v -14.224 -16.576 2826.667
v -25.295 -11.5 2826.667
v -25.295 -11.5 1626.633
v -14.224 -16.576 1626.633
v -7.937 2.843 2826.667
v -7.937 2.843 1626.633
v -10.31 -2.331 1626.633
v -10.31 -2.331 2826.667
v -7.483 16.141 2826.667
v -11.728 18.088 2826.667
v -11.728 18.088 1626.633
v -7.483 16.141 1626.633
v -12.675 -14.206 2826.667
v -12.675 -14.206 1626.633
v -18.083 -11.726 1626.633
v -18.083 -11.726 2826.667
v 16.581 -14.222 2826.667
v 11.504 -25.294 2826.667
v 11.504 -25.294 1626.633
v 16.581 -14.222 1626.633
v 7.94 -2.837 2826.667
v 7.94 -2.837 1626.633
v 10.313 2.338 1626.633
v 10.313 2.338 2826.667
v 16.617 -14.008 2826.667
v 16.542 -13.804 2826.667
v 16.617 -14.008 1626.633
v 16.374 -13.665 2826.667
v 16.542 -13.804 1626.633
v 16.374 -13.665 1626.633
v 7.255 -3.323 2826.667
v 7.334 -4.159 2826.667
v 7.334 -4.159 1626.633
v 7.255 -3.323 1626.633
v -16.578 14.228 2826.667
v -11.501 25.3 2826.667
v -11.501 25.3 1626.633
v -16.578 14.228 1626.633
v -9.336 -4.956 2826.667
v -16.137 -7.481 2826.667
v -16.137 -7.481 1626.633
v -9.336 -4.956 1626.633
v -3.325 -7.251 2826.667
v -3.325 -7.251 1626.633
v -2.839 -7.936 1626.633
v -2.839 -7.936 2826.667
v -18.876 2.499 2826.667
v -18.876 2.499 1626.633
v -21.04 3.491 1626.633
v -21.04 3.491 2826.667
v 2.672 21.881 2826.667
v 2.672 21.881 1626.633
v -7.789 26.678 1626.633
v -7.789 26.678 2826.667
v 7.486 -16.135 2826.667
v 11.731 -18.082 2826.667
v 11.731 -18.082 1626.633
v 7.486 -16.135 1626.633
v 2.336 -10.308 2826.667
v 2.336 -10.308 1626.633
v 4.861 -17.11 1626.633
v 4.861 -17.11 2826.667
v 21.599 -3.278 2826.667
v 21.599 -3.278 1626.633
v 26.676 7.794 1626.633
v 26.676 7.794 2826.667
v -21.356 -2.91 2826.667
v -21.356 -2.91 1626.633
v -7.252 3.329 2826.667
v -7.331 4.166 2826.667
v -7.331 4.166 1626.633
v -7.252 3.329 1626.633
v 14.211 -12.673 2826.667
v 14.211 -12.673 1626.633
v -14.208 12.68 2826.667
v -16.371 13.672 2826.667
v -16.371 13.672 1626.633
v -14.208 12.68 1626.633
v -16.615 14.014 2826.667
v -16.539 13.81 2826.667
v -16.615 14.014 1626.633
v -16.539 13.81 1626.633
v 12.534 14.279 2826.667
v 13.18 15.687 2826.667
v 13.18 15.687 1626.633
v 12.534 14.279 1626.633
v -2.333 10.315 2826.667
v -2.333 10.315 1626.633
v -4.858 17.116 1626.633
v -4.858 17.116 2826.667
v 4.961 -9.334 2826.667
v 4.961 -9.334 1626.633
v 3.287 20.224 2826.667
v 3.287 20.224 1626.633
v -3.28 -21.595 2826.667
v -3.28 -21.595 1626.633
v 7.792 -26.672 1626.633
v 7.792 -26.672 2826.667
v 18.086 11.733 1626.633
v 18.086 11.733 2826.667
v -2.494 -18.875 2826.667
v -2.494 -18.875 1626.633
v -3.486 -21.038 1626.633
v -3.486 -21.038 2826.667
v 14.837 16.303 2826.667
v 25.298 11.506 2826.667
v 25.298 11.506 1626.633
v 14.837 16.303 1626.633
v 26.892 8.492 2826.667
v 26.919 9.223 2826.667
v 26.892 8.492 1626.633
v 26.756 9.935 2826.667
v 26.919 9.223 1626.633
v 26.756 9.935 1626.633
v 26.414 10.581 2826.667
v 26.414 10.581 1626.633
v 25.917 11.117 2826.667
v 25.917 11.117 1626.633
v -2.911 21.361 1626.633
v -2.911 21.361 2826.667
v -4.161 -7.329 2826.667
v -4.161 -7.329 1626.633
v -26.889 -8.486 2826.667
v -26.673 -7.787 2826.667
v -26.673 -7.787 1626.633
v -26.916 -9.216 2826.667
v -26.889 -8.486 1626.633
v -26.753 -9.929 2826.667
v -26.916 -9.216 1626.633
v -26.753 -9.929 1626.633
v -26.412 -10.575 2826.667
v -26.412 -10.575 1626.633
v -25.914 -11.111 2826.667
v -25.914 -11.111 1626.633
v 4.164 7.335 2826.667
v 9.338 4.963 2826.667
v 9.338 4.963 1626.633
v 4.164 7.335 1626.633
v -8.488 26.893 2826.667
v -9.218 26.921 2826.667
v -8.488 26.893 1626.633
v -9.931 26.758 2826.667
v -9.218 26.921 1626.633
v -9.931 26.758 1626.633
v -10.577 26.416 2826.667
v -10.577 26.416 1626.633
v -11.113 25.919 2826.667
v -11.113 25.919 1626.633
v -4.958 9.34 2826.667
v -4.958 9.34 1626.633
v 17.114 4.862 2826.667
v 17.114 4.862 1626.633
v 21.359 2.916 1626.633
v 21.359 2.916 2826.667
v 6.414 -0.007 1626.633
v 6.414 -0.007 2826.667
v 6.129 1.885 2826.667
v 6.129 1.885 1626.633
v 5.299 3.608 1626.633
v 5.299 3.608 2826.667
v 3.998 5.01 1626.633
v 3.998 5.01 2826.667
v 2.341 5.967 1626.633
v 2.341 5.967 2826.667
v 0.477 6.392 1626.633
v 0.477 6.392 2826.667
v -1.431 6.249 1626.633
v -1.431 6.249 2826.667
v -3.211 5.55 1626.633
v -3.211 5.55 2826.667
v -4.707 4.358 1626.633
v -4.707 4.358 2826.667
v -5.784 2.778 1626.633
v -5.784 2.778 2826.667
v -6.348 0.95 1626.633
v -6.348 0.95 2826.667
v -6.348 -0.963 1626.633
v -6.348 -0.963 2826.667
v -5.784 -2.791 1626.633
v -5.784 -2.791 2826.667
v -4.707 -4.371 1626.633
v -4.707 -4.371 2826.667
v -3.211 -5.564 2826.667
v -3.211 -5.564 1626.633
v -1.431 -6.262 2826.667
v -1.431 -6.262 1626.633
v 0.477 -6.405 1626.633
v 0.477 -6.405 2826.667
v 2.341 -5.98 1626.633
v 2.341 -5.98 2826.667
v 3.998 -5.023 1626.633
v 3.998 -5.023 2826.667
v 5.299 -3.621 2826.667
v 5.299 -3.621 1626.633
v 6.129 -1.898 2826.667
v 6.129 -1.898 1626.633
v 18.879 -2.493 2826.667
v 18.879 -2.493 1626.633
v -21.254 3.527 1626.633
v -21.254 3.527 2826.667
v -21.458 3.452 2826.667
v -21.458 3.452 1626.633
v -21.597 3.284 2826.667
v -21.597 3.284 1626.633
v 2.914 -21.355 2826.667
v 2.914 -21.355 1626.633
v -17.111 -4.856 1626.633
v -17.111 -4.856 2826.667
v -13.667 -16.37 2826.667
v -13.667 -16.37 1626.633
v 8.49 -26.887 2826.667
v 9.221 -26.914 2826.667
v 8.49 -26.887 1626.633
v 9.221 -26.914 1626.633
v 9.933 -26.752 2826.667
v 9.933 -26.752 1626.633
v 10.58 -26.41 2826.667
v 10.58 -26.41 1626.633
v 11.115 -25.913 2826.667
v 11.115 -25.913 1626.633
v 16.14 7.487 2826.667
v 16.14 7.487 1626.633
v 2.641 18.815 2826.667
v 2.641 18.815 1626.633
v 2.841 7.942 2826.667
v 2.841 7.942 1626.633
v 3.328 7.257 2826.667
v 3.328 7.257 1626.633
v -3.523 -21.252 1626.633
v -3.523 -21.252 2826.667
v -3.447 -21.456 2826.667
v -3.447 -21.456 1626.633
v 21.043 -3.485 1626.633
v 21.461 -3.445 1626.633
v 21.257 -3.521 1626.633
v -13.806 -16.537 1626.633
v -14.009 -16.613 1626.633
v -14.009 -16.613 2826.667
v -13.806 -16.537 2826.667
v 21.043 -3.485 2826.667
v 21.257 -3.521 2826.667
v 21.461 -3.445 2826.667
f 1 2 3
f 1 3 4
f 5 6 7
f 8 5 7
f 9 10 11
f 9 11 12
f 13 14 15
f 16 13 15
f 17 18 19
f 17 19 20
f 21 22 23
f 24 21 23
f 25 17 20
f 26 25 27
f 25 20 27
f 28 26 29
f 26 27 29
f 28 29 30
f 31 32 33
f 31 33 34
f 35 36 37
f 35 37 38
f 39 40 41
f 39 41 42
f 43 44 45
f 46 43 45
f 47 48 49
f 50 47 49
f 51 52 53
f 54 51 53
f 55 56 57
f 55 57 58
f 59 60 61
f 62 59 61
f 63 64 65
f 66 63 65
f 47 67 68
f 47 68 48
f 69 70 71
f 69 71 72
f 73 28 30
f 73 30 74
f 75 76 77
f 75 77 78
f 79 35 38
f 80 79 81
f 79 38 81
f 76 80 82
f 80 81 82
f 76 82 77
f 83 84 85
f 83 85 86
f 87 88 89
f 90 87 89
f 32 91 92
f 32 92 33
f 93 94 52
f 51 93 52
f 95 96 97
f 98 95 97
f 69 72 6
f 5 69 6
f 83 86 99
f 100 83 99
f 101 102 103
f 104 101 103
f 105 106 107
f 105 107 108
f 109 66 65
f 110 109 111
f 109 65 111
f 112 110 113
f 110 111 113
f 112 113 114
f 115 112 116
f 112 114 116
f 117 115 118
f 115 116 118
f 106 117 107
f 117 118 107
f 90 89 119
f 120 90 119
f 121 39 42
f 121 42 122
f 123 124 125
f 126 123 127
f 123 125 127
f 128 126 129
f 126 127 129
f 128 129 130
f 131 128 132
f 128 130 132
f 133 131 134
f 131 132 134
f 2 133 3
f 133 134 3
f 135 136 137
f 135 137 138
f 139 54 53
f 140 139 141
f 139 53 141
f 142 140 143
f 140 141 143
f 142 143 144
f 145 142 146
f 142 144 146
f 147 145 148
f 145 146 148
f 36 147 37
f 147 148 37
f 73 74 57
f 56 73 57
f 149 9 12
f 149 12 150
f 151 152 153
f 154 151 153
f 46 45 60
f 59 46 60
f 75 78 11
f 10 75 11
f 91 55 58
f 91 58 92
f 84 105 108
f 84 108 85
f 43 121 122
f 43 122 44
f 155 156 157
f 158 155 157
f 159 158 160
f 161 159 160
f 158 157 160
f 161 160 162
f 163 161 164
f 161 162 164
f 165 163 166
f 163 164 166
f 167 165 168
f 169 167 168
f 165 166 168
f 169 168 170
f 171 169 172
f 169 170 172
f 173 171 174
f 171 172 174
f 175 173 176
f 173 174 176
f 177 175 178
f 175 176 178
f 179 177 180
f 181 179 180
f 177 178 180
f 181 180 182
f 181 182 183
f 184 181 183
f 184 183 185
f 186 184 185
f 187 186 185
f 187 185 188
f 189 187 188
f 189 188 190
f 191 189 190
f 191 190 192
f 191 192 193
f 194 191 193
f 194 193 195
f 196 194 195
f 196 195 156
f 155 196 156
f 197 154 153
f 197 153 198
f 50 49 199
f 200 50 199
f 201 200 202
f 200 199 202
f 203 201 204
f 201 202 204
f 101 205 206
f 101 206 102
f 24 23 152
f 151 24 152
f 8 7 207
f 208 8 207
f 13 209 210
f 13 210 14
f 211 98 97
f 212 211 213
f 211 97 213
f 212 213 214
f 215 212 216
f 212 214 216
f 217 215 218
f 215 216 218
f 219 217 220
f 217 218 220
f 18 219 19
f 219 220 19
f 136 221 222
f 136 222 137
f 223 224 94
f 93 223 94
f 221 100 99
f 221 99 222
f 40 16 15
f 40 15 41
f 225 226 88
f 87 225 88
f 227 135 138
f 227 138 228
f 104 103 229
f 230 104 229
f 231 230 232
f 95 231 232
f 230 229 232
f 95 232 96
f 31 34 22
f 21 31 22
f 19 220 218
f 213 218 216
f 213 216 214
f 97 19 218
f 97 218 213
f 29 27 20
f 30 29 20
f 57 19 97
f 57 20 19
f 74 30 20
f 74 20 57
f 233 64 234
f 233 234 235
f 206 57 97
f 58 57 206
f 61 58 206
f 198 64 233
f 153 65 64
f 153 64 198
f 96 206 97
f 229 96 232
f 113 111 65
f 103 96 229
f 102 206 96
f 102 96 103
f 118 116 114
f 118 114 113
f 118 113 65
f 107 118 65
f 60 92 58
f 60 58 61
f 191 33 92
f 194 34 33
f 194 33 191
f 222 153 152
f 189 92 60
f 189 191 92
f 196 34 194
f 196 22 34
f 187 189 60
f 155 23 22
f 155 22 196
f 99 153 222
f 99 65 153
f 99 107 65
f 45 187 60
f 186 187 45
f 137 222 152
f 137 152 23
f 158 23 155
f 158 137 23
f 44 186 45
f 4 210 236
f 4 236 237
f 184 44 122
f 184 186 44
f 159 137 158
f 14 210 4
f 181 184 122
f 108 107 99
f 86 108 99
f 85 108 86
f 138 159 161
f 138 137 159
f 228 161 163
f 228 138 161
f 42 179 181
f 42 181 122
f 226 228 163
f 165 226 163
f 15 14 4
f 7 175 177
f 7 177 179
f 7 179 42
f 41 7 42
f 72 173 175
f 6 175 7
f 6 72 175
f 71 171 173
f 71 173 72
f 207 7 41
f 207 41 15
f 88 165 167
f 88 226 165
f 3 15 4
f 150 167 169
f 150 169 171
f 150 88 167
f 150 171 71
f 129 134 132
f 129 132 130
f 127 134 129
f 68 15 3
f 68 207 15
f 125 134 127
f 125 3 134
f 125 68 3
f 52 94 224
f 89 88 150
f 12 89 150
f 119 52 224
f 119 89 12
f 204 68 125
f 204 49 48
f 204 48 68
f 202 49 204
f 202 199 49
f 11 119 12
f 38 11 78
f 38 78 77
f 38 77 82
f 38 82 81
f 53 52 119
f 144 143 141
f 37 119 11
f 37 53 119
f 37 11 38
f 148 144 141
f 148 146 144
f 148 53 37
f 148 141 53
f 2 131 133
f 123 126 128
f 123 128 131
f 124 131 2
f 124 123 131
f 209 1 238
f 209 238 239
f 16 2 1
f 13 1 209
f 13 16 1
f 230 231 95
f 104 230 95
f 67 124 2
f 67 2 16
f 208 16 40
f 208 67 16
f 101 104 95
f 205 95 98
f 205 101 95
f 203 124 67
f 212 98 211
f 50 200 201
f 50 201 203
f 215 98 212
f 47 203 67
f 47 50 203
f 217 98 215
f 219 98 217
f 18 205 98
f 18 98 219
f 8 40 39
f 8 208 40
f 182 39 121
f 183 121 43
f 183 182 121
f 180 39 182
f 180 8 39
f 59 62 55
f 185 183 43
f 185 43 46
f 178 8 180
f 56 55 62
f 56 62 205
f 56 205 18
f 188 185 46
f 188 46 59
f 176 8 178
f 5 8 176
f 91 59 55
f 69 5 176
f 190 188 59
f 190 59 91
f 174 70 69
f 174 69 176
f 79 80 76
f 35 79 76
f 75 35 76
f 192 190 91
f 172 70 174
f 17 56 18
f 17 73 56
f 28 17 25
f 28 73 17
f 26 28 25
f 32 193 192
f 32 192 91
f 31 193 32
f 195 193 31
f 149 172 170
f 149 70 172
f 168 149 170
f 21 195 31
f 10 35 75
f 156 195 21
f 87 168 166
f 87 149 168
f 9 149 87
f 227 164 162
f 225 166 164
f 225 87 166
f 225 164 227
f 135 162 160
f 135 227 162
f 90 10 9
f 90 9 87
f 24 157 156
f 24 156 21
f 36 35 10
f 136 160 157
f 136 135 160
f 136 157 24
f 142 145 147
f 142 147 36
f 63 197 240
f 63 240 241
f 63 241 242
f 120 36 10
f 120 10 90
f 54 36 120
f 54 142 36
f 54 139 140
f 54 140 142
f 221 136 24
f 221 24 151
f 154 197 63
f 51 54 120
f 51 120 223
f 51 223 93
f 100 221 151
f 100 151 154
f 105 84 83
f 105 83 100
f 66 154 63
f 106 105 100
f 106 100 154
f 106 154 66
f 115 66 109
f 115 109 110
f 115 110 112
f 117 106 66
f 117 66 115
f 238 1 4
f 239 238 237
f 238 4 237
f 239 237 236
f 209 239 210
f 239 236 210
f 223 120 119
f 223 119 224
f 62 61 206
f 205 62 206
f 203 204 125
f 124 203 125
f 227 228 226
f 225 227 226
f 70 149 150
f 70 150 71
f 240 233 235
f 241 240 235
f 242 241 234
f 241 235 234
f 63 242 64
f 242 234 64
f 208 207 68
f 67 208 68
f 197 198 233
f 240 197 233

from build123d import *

# Parameters (mm, degrees)
BOSS_EXTRUDE1_DEPTH = 2000
SCALE1_SCALE        = 3
SKETCH2_R           = 115.047789556
CUT_EXTRUDE1_DEPTH  = 1600
SKETCH3_R           = 13.75
CUT_EXTRUDE2_DEPTH  = 4401
SCALE2_SCALE        = 0.466666667
CUT_EXTRUDE3_DEPTH  = 53.3
CUT_EXTRUDE4_DEPTH  = 800


with BuildPart() as part:
    # Sketch1 → Boss-Extrude1 (new body)
    with BuildSketch(Plane.XY):
        with BuildLine():
            Line((-8.216270499, 18.069114507), (-11.842563011, 10.160890774))
            ThreePointArc((-11.842563011, 10.160890774), (-11.851111664, 9.931439908), (-11.694910211, 9.763148835))
            Line((-11.694910211, 9.763148835), (-10.149625113, 9.054562941))
            Line((-10.149625113, 9.054562941), (-8.37816038, 12.917775685))
            Line((-8.37816038, 12.917775685), (-5.345959751, 11.527369089))
            Line((-5.345959751, 11.527369089), (-3.542521768, 6.669331059))
            Line((-3.542521768, 6.669331059), (-5.237363855, 2.973217088))
            Line((-5.237363855, 2.973217088), (-5.181250032, 2.375846818))
            Line((-5.181250032, 2.375846818), (-5.67053095, 2.028565688))
            Line((-5.67053095, 2.028565688), (-7.365373037, -1.667548284))
            Line((-7.365373037, -1.667548284), (-12.223411067, -3.470986267))
            Line((-12.223411067, -3.470986267), (-15.255611696, -2.080579672))
            Line((-15.255611696, -2.080579672), (-13.484146963, 1.782633072))
            Line((-13.484146963, 1.782633072), (-15.029432061, 2.491218965))
            ThreePointArc((-15.029432061, 2.491218965), (-15.258882927, 2.499767617), (-15.427174, 2.343566164))
            Line((-15.427174, 2.343566164), (-19.053466512, -5.564657569))
            ThreePointArc((-19.053466512, -5.564657569), (-19.110457529, -7.094330009), (-18.069114507, -8.216270499))
            Line((-18.069114507, -8.216270499), (-10.160890774, -11.842563011))
            ThreePointArc((-10.160890774, -11.842563011), (-9.931439908, -11.851111664), (-9.763148835, -11.694910211))
            Line((-9.763148835, -11.694910211), (-9.054562941, -10.149625113))
            Line((-9.054562941, -10.149625113), (-12.917775685, -8.37816038))
            Line((-12.917775685, -8.37816038), (-11.527369089, -5.345959751))
            Line((-11.527369089, -5.345959751), (-6.669331059, -3.542521768))
            Line((-6.669331059, -3.542521768), (-2.973217088, -5.237363855))
            Line((-2.973217088, -5.237363855), (-2.375846818, -5.181250032))
            Line((-2.375846818, -5.181250032), (-2.028565688, -5.67053095))
            Line((-2.028565688, -5.67053095), (1.667548284, -7.365373037))
            Line((1.667548284, -7.365373037), (3.470986267, -12.223411067))
            Line((3.470986267, -12.223411067), (2.080579672, -15.255611696))
            Line((2.080579672, -15.255611696), (-1.782633072, -13.484146963))
            Line((-1.782633072, -13.484146963), (-2.491218965, -15.029432061))
            ThreePointArc((-2.491218965, -15.029432061), (-2.499767617, -15.258882927), (-2.343566164, -15.427174))
            Line((-2.343566164, -15.427174), (5.564657569, -19.053466512))
            ThreePointArc((5.564657569, -19.053466512), (7.094330009, -19.110457529), (8.216270499, -18.069114507))
            Line((8.216270499, -18.069114507), (11.842563011, -10.160890774))
            ThreePointArc((11.842563011, -10.160890774), (11.851111664, -9.931439908), (11.694910211, -9.763148835))
            Line((11.694910211, -9.763148835), (10.149625113, -9.054562941))
            Line((10.149625113, -9.054562941), (8.37816038, -12.917775685))
            Line((8.37816038, -12.917775685), (5.345959751, -11.527369089))
            Line((5.345959751, -11.527369089), (3.542521768, -6.669331059))
            Line((3.542521768, -6.669331059), (5.237363855, -2.973217088))
            Line((5.237363855, -2.973217088), (5.181250032, -2.375846818))
            Line((5.181250032, -2.375846818), (5.67053095, -2.028565688))
            Line((5.67053095, -2.028565688), (7.365373037, 1.667548284))
            Line((7.365373037, 1.667548284), (12.223411067, 3.470986267))
            Line((12.223411067, 3.470986267), (15.255611696, 2.080579672))
            Line((15.255611696, 2.080579672), (13.484146963, -1.782633072))
            Line((13.484146963, -1.782633072), (15.029432061, -2.491218965))
            ThreePointArc((15.029432061, -2.491218965), (15.258882927, -2.499767617), (15.427174, -2.343566164))
            Line((15.427174, -2.343566164), (19.053466512, 5.564657569))
            ThreePointArc((19.053466512, 5.564657569), (19.110457529, 7.094330009), (18.069114507, 8.216270499))
            Line((18.069114507, 8.216270499), (10.597022809, 11.642575962))
            Line((10.597022809, 11.642575962), (9.413078742, 11.203063202))
            Line((9.413078742, 11.203063202), (8.951663933, 10.196809148))
            Line((8.951663933, 10.196809148), (12.917775685, 8.37816038))
            Line((12.917775685, 8.37816038), (11.527369089, 5.345959751))
            Line((11.527369089, 5.345959751), (6.669331059, 3.542521768))
            Line((6.669331059, 3.542521768), (2.973217088, 5.237363855))
            Line((2.973217088, 5.237363855), (2.375846818, 5.181250032))
            Line((2.375846818, 5.181250032), (2.028565688, 5.67053095))
            Line((2.028565688, 5.67053095), (-1.667548284, 7.365373037))
            Line((-1.667548284, 7.365373037), (-3.470986267, 12.223411067))
            Line((-3.470986267, 12.223411067), (-2.080579672, 15.255611696))
            Line((-2.080579672, 15.255611696), (1.88553208, 13.436962929))
            Line((1.88553208, 13.436962929), (2.346946889, 14.443216983))
            Line((2.346946889, 14.443216983), (1.907434129, 15.62716105))
            Line((1.907434129, 15.62716105), (-5.564657569, 19.053466512))
            ThreePointArc((-5.564657569, 19.053466512), (-7.094330009, 19.110457529), (-8.216270499, 18.069114507))
        make_face()
    extrude(amount=BOSS_EXTRUDE1_DEPTH)


with BuildPart() as part_1:
    # Scale1: scaled about (-0.00473582, -0.010327884, 1000)
    add(part.part.scale(SCALE1_SCALE).moved(Location((0.00947164, 0.020655768, -2000))))

    # Sketch2 → Cut-Extrude1 (cut)
    with BuildSketch(Plane(origin=(0, 0, -2000), x_dir=(-1, 0, 0), z_dir=(0, 0, -1))):
        Circle(SKETCH2_R)
    extrude(amount=-CUT_EXTRUDE1_DEPTH, mode=Mode.SUBTRACT)

    # Sketch3 → Cut-Extrude2 (cut, through all)
    with BuildSketch(Plane.XY.offset(4000)):
        Circle(SKETCH3_R)
    extrude(amount=-CUT_EXTRUDE2_DEPTH, mode=Mode.SUBTRACT)


with BuildPart() as part_2:
    # Scale2: scaled about (-0.005610815, -0.012236071, 1800)
    add(part_1.part.scale(SCALE2_SCALE).moved(Location((-0.002992435, -0.006525905, 960))))

    # Sketch6 → Cut-Extrude3 (cut)
    with BuildSketch(Plane(origin=(0, 0, 773.333333333), x_dir=(-1, 0, 0), z_dir=(0, 0, -1))):
        with BuildLine():
            Line((7.789092932, 26.67796657), (-2.671835446, 21.881138923))
            Line((-2.671835446, 21.881138923), (-3.287153309, 20.223617229))
            Line((-3.287153309, 20.223617229), (-2.641172576, 18.814861553))
            Line((-2.641172576, 18.814861553), (2.911383876, 21.360969828))
            Line((2.911383876, 21.360969828), (4.857953109, 17.115888947))
            Line((4.857953109, 17.115888947), (2.333139933, 10.314635704))
            Line((2.333139933, 10.314635704), (-2.841419627, 7.941856782))
            Line((-2.841419627, 7.941856782), (-3.32761321, 7.256863498))
            Line((-3.32761321, 7.256863498), (-4.163931587, 7.33542285))
            Line((-4.163931587, 7.33542285), (-9.338491147, 4.962643928))
            Line((-9.338491147, 4.962643928), (-16.13974439, 7.487457104))
            Line((-16.13974439, 7.487457104), (-18.086313623, 11.732537985))
            Line((-18.086313623, 11.732537985), (-12.533757171, 14.27864626))
            Line((-12.533757171, 14.27864626), (-13.179737904, 15.687401936))
            Line((-13.179737904, 15.687401936), (-14.837259597, 16.302719799))
            Line((-14.837259597, 16.302719799), (-25.298187975, 11.505892152))
            ThreePointArc((-25.298187975, 11.505892152), (-26.756068205, 9.935175466), (-26.676280782, 7.79363405))
            Line((-26.676280782, 7.79363405), (-21.599471265, -3.277879177))
            ThreePointArc((-21.599471265, -3.277879177), (-21.363863762, -3.496561211), (-21.04263255, -3.484593098))
            Line((-21.04263255, -3.484593098), (-18.879233413, -2.492572848))
            Line((-18.879233413, -2.492572848), (-21.359284039, 2.915924993))
            Line((-21.359284039, 2.915924993), (-17.114203158, 4.862494227))
            Line((-17.114203158, 4.862494227), (-10.312949916, 2.33768105))
            Line((-10.312949916, 2.33768105), (-7.940170994, -2.83687851))
            Line((-7.940170994, -2.83687851), (-7.25517771, -3.323072093))
            Line((-7.25517771, -3.323072093), (-7.333737061, -4.15939047))
            Line((-7.333737061, -4.15939047), (-4.960958139, -9.33395003))
            Line((-4.960958139, -9.33395003), (-7.485771316, -16.135203272))
            Line((-7.485771316, -16.135203272), (-11.730852197, -18.081772506))
            Line((-11.730852197, -18.081772506), (-14.210902823, -12.673274665))
            Line((-14.210902823, -12.673274665), (-16.374301959, -13.665294916))
            ThreePointArc((-16.374301959, -13.665294916), (-16.592983994, -13.900902418), (-16.58101588, -14.222133631))
            Line((-16.58101588, -14.222133631), (-11.504206363, -25.293646858))
            ThreePointArc((-11.504206363, -25.293646858), (-9.933489678, -26.751527087), (-7.791948261, -26.671739664))
            Line((-7.791948261, -26.671739664), (3.279564965, -21.594930148))
            ThreePointArc((3.279564965, -21.594930148), (3.498247, -21.359322645), (3.486278886, -21.038091432))
            Line((3.486278886, -21.038091432), (2.494258636, -18.874692296))
            Line((2.494258636, -18.874692296), (-2.914239205, -21.354742922))
            Line((-2.914239205, -21.354742922), (-4.860808438, -17.109662041))
            Line((-4.860808438, -17.109662041), (-2.335995262, -10.308408799))
            Line((-2.335995262, -10.308408799), (2.838564298, -7.935629877))
            Line((2.838564298, -7.935629877), (3.324757881, -7.250636592))
            Line((3.324757881, -7.250636592), (4.161076258, -7.329195944))
            Line((4.161076258, -7.329195944), (9.335635818, -4.956417022))
            Line((9.335635818, -4.956417022), (16.13688906, -7.481230198))
            Line((16.13688906, -7.481230198), (18.083458294, -11.72631108))
            Line((18.083458294, -11.72631108), (12.674960453, -14.206361706))
            Line((12.674960453, -14.206361706), (13.666980704, -16.369760842))
            ThreePointArc((13.666980704, -16.369760842), (13.902588207, -16.588442876), (14.223819419, -16.576474763))
            Line((14.223819419, -16.576474763), (25.295332646, -11.499665246))
            ThreePointArc((25.295332646, -11.499665246), (26.753212876, -9.92894856), (26.673425453, -7.787407144))
            Line((26.673425453, -7.787407144), (21.596615936, 3.284106083))
            ThreePointArc((21.596615936, 3.284106083), (21.361008433, 3.502788117), (21.039777221, 3.490820004))
            Line((21.039777221, 3.490820004), (18.876378084, 2.498799753))
            Line((18.876378084, 2.498799753), (21.35642871, -2.909698087))
            Line((21.35642871, -2.909698087), (17.111347829, -4.856267321))
            Line((17.111347829, -4.856267321), (10.310094587, -2.331454145))
            Line((10.310094587, -2.331454145), (7.937315665, 2.843105415))
            Line((7.937315665, 2.843105415), (7.252322381, 3.329298998))
            Line((7.252322381, 3.329298998), (7.330881732, 4.165617376))
            Line((7.330881732, 4.165617376), (4.95810281, 9.340176936))
            Line((4.95810281, 9.340176936), (7.482915987, 16.141430178))
            Line((7.482915987, 16.141430178), (11.727996868, 18.087999412))
            Line((11.727996868, 18.087999412), (14.208047494, 12.679501571))
            Line((14.208047494, 12.679501571), (16.37144663, 13.671521821))
            ThreePointArc((16.37144663, 13.671521821), (16.590128665, 13.907129324), (16.578160551, 14.228360537))
            Line((16.578160551, 14.228360537), (11.501351034, 25.299873763))
            ThreePointArc((11.501351034, 25.299873763), (9.930634349, 26.757753993), (7.789092932, 26.67796657))
        make_face()
    extrude(amount=-CUT_EXTRUDE3_DEPTH, mode=Mode.SUBTRACT)

    # Sketch7 → Cut-Extrude4 (cut)
    with BuildSketch(Plane(origin=(0, 0, 826.633333333), x_dir=(-1, 0, 0), z_dir=(0, 0, -1))):
        with BuildLine():
            Line((7.789092932, 26.67796657), (-2.671835446, 21.881138923))
            Line((-2.671835446, 21.881138923), (-3.287153309, 20.223617229))
            Line((-3.287153309, 20.223617229), (-2.641172576, 18.814861553))
            Line((-2.641172576, 18.814861553), (2.911383876, 21.360969828))
            Line((2.911383876, 21.360969828), (4.857953109, 17.115888947))
            Line((4.857953109, 17.115888947), (2.333139933, 10.314635704))
            Line((2.333139933, 10.314635704), (-2.841419627, 7.941856782))
            Line((-2.841419627, 7.941856782), (-3.32761321, 7.256863498))
            Line((-3.32761321, 7.256863498), (-4.163931587, 7.33542285))
            Line((-4.163931587, 7.33542285), (-9.338491147, 4.962643928))
            Line((-9.338491147, 4.962643928), (-16.13974439, 7.487457104))
            Line((-16.13974439, 7.487457104), (-18.086313623, 11.732537985))
            Line((-18.086313623, 11.732537985), (-12.533757171, 14.27864626))
            Line((-12.533757171, 14.27864626), (-13.179737904, 15.687401936))
            Line((-13.179737904, 15.687401936), (-14.837259597, 16.302719799))
            Line((-14.837259597, 16.302719799), (-25.298187975, 11.505892152))
            ThreePointArc((-25.298187975, 11.505892152), (-26.756068205, 9.935175466), (-26.676280782, 7.79363405))
            Line((-26.676280782, 7.79363405), (-21.599471265, -3.277879177))
            ThreePointArc((-21.599471265, -3.277879177), (-21.363863762, -3.496561211), (-21.04263255, -3.484593098))
            Line((-21.04263255, -3.484593098), (-18.879233413, -2.492572848))
            Line((-18.879233413, -2.492572848), (-21.359284039, 2.915924993))
            Line((-21.359284039, 2.915924993), (-17.114203158, 4.862494227))
            Line((-17.114203158, 4.862494227), (-10.312949916, 2.33768105))
            Line((-10.312949916, 2.33768105), (-7.940170994, -2.83687851))
            Line((-7.940170994, -2.83687851), (-7.25517771, -3.323072093))
            Line((-7.25517771, -3.323072093), (-7.333737061, -4.15939047))
            Line((-7.333737061, -4.15939047), (-4.960958139, -9.33395003))
            Line((-4.960958139, -9.33395003), (-7.485771316, -16.135203272))
            Line((-7.485771316, -16.135203272), (-11.730852197, -18.081772506))
            Line((-11.730852197, -18.081772506), (-14.210902823, -12.673274665))
            Line((-14.210902823, -12.673274665), (-16.374301959, -13.665294916))
            ThreePointArc((-16.374301959, -13.665294916), (-16.592983994, -13.900902418), (-16.58101588, -14.222133631))
            Line((-16.58101588, -14.222133631), (-11.504206363, -25.293646858))
            ThreePointArc((-11.504206363, -25.293646858), (-9.933489678, -26.751527087), (-7.791948261, -26.671739664))
            Line((-7.791948261, -26.671739664), (3.279564965, -21.594930148))
            ThreePointArc((3.279564965, -21.594930148), (3.498247, -21.359322645), (3.486278886, -21.038091432))
            Line((3.486278886, -21.038091432), (2.494258636, -18.874692296))
            Line((2.494258636, -18.874692296), (-2.914239205, -21.354742922))
            Line((-2.914239205, -21.354742922), (-4.860808438, -17.109662041))
            Line((-4.860808438, -17.109662041), (-2.335995262, -10.308408799))
            Line((-2.335995262, -10.308408799), (2.838564298, -7.935629877))
            Line((2.838564298, -7.935629877), (3.324757881, -7.250636592))
            Line((3.324757881, -7.250636592), (4.161076258, -7.329195944))
            Line((4.161076258, -7.329195944), (9.335635818, -4.956417022))
            Line((9.335635818, -4.956417022), (16.13688906, -7.481230198))
            Line((16.13688906, -7.481230198), (18.083458294, -11.72631108))
            Line((18.083458294, -11.72631108), (12.674960453, -14.206361706))
            Line((12.674960453, -14.206361706), (13.666980704, -16.369760842))
            ThreePointArc((13.666980704, -16.369760842), (13.902588207, -16.588442876), (14.223819419, -16.576474763))
            Line((14.223819419, -16.576474763), (25.295332646, -11.499665246))
            ThreePointArc((25.295332646, -11.499665246), (26.753212876, -9.92894856), (26.673425453, -7.787407144))
            Line((26.673425453, -7.787407144), (21.596615936, 3.284106083))
            ThreePointArc((21.596615936, 3.284106083), (21.361008433, 3.502788117), (21.039777221, 3.490820004))
            Line((21.039777221, 3.490820004), (18.876378084, 2.498799753))
            Line((18.876378084, 2.498799753), (21.35642871, -2.909698087))
            Line((21.35642871, -2.909698087), (17.111347829, -4.856267321))
            Line((17.111347829, -4.856267321), (10.310094587, -2.331454145))
            Line((10.310094587, -2.331454145), (7.937315665, 2.843105415))
            Line((7.937315665, 2.843105415), (7.252322381, 3.329298998))
            Line((7.252322381, 3.329298998), (7.330881732, 4.165617376))
            Line((7.330881732, 4.165617376), (4.95810281, 9.340176936))
            Line((4.95810281, 9.340176936), (7.482915987, 16.141430178))
            Line((7.482915987, 16.141430178), (11.727996868, 18.087999412))
            Line((11.727996868, 18.087999412), (14.208047494, 12.679501571))
            Line((14.208047494, 12.679501571), (16.37144663, 13.671521821))
            ThreePointArc((16.37144663, 13.671521821), (16.590128665, 13.907129324), (16.578160551, 14.228360537))
            Line((16.578160551, 14.228360537), (11.501351034, 25.299873763))
            ThreePointArc((11.501351034, 25.299873763), (9.930634349, 26.757753993), (7.789092932, 26.67796657))
        make_face()
    extrude(amount=-CUT_EXTRUDE4_DEPTH, mode=Mode.SUBTRACT)


solid = part_2.part
